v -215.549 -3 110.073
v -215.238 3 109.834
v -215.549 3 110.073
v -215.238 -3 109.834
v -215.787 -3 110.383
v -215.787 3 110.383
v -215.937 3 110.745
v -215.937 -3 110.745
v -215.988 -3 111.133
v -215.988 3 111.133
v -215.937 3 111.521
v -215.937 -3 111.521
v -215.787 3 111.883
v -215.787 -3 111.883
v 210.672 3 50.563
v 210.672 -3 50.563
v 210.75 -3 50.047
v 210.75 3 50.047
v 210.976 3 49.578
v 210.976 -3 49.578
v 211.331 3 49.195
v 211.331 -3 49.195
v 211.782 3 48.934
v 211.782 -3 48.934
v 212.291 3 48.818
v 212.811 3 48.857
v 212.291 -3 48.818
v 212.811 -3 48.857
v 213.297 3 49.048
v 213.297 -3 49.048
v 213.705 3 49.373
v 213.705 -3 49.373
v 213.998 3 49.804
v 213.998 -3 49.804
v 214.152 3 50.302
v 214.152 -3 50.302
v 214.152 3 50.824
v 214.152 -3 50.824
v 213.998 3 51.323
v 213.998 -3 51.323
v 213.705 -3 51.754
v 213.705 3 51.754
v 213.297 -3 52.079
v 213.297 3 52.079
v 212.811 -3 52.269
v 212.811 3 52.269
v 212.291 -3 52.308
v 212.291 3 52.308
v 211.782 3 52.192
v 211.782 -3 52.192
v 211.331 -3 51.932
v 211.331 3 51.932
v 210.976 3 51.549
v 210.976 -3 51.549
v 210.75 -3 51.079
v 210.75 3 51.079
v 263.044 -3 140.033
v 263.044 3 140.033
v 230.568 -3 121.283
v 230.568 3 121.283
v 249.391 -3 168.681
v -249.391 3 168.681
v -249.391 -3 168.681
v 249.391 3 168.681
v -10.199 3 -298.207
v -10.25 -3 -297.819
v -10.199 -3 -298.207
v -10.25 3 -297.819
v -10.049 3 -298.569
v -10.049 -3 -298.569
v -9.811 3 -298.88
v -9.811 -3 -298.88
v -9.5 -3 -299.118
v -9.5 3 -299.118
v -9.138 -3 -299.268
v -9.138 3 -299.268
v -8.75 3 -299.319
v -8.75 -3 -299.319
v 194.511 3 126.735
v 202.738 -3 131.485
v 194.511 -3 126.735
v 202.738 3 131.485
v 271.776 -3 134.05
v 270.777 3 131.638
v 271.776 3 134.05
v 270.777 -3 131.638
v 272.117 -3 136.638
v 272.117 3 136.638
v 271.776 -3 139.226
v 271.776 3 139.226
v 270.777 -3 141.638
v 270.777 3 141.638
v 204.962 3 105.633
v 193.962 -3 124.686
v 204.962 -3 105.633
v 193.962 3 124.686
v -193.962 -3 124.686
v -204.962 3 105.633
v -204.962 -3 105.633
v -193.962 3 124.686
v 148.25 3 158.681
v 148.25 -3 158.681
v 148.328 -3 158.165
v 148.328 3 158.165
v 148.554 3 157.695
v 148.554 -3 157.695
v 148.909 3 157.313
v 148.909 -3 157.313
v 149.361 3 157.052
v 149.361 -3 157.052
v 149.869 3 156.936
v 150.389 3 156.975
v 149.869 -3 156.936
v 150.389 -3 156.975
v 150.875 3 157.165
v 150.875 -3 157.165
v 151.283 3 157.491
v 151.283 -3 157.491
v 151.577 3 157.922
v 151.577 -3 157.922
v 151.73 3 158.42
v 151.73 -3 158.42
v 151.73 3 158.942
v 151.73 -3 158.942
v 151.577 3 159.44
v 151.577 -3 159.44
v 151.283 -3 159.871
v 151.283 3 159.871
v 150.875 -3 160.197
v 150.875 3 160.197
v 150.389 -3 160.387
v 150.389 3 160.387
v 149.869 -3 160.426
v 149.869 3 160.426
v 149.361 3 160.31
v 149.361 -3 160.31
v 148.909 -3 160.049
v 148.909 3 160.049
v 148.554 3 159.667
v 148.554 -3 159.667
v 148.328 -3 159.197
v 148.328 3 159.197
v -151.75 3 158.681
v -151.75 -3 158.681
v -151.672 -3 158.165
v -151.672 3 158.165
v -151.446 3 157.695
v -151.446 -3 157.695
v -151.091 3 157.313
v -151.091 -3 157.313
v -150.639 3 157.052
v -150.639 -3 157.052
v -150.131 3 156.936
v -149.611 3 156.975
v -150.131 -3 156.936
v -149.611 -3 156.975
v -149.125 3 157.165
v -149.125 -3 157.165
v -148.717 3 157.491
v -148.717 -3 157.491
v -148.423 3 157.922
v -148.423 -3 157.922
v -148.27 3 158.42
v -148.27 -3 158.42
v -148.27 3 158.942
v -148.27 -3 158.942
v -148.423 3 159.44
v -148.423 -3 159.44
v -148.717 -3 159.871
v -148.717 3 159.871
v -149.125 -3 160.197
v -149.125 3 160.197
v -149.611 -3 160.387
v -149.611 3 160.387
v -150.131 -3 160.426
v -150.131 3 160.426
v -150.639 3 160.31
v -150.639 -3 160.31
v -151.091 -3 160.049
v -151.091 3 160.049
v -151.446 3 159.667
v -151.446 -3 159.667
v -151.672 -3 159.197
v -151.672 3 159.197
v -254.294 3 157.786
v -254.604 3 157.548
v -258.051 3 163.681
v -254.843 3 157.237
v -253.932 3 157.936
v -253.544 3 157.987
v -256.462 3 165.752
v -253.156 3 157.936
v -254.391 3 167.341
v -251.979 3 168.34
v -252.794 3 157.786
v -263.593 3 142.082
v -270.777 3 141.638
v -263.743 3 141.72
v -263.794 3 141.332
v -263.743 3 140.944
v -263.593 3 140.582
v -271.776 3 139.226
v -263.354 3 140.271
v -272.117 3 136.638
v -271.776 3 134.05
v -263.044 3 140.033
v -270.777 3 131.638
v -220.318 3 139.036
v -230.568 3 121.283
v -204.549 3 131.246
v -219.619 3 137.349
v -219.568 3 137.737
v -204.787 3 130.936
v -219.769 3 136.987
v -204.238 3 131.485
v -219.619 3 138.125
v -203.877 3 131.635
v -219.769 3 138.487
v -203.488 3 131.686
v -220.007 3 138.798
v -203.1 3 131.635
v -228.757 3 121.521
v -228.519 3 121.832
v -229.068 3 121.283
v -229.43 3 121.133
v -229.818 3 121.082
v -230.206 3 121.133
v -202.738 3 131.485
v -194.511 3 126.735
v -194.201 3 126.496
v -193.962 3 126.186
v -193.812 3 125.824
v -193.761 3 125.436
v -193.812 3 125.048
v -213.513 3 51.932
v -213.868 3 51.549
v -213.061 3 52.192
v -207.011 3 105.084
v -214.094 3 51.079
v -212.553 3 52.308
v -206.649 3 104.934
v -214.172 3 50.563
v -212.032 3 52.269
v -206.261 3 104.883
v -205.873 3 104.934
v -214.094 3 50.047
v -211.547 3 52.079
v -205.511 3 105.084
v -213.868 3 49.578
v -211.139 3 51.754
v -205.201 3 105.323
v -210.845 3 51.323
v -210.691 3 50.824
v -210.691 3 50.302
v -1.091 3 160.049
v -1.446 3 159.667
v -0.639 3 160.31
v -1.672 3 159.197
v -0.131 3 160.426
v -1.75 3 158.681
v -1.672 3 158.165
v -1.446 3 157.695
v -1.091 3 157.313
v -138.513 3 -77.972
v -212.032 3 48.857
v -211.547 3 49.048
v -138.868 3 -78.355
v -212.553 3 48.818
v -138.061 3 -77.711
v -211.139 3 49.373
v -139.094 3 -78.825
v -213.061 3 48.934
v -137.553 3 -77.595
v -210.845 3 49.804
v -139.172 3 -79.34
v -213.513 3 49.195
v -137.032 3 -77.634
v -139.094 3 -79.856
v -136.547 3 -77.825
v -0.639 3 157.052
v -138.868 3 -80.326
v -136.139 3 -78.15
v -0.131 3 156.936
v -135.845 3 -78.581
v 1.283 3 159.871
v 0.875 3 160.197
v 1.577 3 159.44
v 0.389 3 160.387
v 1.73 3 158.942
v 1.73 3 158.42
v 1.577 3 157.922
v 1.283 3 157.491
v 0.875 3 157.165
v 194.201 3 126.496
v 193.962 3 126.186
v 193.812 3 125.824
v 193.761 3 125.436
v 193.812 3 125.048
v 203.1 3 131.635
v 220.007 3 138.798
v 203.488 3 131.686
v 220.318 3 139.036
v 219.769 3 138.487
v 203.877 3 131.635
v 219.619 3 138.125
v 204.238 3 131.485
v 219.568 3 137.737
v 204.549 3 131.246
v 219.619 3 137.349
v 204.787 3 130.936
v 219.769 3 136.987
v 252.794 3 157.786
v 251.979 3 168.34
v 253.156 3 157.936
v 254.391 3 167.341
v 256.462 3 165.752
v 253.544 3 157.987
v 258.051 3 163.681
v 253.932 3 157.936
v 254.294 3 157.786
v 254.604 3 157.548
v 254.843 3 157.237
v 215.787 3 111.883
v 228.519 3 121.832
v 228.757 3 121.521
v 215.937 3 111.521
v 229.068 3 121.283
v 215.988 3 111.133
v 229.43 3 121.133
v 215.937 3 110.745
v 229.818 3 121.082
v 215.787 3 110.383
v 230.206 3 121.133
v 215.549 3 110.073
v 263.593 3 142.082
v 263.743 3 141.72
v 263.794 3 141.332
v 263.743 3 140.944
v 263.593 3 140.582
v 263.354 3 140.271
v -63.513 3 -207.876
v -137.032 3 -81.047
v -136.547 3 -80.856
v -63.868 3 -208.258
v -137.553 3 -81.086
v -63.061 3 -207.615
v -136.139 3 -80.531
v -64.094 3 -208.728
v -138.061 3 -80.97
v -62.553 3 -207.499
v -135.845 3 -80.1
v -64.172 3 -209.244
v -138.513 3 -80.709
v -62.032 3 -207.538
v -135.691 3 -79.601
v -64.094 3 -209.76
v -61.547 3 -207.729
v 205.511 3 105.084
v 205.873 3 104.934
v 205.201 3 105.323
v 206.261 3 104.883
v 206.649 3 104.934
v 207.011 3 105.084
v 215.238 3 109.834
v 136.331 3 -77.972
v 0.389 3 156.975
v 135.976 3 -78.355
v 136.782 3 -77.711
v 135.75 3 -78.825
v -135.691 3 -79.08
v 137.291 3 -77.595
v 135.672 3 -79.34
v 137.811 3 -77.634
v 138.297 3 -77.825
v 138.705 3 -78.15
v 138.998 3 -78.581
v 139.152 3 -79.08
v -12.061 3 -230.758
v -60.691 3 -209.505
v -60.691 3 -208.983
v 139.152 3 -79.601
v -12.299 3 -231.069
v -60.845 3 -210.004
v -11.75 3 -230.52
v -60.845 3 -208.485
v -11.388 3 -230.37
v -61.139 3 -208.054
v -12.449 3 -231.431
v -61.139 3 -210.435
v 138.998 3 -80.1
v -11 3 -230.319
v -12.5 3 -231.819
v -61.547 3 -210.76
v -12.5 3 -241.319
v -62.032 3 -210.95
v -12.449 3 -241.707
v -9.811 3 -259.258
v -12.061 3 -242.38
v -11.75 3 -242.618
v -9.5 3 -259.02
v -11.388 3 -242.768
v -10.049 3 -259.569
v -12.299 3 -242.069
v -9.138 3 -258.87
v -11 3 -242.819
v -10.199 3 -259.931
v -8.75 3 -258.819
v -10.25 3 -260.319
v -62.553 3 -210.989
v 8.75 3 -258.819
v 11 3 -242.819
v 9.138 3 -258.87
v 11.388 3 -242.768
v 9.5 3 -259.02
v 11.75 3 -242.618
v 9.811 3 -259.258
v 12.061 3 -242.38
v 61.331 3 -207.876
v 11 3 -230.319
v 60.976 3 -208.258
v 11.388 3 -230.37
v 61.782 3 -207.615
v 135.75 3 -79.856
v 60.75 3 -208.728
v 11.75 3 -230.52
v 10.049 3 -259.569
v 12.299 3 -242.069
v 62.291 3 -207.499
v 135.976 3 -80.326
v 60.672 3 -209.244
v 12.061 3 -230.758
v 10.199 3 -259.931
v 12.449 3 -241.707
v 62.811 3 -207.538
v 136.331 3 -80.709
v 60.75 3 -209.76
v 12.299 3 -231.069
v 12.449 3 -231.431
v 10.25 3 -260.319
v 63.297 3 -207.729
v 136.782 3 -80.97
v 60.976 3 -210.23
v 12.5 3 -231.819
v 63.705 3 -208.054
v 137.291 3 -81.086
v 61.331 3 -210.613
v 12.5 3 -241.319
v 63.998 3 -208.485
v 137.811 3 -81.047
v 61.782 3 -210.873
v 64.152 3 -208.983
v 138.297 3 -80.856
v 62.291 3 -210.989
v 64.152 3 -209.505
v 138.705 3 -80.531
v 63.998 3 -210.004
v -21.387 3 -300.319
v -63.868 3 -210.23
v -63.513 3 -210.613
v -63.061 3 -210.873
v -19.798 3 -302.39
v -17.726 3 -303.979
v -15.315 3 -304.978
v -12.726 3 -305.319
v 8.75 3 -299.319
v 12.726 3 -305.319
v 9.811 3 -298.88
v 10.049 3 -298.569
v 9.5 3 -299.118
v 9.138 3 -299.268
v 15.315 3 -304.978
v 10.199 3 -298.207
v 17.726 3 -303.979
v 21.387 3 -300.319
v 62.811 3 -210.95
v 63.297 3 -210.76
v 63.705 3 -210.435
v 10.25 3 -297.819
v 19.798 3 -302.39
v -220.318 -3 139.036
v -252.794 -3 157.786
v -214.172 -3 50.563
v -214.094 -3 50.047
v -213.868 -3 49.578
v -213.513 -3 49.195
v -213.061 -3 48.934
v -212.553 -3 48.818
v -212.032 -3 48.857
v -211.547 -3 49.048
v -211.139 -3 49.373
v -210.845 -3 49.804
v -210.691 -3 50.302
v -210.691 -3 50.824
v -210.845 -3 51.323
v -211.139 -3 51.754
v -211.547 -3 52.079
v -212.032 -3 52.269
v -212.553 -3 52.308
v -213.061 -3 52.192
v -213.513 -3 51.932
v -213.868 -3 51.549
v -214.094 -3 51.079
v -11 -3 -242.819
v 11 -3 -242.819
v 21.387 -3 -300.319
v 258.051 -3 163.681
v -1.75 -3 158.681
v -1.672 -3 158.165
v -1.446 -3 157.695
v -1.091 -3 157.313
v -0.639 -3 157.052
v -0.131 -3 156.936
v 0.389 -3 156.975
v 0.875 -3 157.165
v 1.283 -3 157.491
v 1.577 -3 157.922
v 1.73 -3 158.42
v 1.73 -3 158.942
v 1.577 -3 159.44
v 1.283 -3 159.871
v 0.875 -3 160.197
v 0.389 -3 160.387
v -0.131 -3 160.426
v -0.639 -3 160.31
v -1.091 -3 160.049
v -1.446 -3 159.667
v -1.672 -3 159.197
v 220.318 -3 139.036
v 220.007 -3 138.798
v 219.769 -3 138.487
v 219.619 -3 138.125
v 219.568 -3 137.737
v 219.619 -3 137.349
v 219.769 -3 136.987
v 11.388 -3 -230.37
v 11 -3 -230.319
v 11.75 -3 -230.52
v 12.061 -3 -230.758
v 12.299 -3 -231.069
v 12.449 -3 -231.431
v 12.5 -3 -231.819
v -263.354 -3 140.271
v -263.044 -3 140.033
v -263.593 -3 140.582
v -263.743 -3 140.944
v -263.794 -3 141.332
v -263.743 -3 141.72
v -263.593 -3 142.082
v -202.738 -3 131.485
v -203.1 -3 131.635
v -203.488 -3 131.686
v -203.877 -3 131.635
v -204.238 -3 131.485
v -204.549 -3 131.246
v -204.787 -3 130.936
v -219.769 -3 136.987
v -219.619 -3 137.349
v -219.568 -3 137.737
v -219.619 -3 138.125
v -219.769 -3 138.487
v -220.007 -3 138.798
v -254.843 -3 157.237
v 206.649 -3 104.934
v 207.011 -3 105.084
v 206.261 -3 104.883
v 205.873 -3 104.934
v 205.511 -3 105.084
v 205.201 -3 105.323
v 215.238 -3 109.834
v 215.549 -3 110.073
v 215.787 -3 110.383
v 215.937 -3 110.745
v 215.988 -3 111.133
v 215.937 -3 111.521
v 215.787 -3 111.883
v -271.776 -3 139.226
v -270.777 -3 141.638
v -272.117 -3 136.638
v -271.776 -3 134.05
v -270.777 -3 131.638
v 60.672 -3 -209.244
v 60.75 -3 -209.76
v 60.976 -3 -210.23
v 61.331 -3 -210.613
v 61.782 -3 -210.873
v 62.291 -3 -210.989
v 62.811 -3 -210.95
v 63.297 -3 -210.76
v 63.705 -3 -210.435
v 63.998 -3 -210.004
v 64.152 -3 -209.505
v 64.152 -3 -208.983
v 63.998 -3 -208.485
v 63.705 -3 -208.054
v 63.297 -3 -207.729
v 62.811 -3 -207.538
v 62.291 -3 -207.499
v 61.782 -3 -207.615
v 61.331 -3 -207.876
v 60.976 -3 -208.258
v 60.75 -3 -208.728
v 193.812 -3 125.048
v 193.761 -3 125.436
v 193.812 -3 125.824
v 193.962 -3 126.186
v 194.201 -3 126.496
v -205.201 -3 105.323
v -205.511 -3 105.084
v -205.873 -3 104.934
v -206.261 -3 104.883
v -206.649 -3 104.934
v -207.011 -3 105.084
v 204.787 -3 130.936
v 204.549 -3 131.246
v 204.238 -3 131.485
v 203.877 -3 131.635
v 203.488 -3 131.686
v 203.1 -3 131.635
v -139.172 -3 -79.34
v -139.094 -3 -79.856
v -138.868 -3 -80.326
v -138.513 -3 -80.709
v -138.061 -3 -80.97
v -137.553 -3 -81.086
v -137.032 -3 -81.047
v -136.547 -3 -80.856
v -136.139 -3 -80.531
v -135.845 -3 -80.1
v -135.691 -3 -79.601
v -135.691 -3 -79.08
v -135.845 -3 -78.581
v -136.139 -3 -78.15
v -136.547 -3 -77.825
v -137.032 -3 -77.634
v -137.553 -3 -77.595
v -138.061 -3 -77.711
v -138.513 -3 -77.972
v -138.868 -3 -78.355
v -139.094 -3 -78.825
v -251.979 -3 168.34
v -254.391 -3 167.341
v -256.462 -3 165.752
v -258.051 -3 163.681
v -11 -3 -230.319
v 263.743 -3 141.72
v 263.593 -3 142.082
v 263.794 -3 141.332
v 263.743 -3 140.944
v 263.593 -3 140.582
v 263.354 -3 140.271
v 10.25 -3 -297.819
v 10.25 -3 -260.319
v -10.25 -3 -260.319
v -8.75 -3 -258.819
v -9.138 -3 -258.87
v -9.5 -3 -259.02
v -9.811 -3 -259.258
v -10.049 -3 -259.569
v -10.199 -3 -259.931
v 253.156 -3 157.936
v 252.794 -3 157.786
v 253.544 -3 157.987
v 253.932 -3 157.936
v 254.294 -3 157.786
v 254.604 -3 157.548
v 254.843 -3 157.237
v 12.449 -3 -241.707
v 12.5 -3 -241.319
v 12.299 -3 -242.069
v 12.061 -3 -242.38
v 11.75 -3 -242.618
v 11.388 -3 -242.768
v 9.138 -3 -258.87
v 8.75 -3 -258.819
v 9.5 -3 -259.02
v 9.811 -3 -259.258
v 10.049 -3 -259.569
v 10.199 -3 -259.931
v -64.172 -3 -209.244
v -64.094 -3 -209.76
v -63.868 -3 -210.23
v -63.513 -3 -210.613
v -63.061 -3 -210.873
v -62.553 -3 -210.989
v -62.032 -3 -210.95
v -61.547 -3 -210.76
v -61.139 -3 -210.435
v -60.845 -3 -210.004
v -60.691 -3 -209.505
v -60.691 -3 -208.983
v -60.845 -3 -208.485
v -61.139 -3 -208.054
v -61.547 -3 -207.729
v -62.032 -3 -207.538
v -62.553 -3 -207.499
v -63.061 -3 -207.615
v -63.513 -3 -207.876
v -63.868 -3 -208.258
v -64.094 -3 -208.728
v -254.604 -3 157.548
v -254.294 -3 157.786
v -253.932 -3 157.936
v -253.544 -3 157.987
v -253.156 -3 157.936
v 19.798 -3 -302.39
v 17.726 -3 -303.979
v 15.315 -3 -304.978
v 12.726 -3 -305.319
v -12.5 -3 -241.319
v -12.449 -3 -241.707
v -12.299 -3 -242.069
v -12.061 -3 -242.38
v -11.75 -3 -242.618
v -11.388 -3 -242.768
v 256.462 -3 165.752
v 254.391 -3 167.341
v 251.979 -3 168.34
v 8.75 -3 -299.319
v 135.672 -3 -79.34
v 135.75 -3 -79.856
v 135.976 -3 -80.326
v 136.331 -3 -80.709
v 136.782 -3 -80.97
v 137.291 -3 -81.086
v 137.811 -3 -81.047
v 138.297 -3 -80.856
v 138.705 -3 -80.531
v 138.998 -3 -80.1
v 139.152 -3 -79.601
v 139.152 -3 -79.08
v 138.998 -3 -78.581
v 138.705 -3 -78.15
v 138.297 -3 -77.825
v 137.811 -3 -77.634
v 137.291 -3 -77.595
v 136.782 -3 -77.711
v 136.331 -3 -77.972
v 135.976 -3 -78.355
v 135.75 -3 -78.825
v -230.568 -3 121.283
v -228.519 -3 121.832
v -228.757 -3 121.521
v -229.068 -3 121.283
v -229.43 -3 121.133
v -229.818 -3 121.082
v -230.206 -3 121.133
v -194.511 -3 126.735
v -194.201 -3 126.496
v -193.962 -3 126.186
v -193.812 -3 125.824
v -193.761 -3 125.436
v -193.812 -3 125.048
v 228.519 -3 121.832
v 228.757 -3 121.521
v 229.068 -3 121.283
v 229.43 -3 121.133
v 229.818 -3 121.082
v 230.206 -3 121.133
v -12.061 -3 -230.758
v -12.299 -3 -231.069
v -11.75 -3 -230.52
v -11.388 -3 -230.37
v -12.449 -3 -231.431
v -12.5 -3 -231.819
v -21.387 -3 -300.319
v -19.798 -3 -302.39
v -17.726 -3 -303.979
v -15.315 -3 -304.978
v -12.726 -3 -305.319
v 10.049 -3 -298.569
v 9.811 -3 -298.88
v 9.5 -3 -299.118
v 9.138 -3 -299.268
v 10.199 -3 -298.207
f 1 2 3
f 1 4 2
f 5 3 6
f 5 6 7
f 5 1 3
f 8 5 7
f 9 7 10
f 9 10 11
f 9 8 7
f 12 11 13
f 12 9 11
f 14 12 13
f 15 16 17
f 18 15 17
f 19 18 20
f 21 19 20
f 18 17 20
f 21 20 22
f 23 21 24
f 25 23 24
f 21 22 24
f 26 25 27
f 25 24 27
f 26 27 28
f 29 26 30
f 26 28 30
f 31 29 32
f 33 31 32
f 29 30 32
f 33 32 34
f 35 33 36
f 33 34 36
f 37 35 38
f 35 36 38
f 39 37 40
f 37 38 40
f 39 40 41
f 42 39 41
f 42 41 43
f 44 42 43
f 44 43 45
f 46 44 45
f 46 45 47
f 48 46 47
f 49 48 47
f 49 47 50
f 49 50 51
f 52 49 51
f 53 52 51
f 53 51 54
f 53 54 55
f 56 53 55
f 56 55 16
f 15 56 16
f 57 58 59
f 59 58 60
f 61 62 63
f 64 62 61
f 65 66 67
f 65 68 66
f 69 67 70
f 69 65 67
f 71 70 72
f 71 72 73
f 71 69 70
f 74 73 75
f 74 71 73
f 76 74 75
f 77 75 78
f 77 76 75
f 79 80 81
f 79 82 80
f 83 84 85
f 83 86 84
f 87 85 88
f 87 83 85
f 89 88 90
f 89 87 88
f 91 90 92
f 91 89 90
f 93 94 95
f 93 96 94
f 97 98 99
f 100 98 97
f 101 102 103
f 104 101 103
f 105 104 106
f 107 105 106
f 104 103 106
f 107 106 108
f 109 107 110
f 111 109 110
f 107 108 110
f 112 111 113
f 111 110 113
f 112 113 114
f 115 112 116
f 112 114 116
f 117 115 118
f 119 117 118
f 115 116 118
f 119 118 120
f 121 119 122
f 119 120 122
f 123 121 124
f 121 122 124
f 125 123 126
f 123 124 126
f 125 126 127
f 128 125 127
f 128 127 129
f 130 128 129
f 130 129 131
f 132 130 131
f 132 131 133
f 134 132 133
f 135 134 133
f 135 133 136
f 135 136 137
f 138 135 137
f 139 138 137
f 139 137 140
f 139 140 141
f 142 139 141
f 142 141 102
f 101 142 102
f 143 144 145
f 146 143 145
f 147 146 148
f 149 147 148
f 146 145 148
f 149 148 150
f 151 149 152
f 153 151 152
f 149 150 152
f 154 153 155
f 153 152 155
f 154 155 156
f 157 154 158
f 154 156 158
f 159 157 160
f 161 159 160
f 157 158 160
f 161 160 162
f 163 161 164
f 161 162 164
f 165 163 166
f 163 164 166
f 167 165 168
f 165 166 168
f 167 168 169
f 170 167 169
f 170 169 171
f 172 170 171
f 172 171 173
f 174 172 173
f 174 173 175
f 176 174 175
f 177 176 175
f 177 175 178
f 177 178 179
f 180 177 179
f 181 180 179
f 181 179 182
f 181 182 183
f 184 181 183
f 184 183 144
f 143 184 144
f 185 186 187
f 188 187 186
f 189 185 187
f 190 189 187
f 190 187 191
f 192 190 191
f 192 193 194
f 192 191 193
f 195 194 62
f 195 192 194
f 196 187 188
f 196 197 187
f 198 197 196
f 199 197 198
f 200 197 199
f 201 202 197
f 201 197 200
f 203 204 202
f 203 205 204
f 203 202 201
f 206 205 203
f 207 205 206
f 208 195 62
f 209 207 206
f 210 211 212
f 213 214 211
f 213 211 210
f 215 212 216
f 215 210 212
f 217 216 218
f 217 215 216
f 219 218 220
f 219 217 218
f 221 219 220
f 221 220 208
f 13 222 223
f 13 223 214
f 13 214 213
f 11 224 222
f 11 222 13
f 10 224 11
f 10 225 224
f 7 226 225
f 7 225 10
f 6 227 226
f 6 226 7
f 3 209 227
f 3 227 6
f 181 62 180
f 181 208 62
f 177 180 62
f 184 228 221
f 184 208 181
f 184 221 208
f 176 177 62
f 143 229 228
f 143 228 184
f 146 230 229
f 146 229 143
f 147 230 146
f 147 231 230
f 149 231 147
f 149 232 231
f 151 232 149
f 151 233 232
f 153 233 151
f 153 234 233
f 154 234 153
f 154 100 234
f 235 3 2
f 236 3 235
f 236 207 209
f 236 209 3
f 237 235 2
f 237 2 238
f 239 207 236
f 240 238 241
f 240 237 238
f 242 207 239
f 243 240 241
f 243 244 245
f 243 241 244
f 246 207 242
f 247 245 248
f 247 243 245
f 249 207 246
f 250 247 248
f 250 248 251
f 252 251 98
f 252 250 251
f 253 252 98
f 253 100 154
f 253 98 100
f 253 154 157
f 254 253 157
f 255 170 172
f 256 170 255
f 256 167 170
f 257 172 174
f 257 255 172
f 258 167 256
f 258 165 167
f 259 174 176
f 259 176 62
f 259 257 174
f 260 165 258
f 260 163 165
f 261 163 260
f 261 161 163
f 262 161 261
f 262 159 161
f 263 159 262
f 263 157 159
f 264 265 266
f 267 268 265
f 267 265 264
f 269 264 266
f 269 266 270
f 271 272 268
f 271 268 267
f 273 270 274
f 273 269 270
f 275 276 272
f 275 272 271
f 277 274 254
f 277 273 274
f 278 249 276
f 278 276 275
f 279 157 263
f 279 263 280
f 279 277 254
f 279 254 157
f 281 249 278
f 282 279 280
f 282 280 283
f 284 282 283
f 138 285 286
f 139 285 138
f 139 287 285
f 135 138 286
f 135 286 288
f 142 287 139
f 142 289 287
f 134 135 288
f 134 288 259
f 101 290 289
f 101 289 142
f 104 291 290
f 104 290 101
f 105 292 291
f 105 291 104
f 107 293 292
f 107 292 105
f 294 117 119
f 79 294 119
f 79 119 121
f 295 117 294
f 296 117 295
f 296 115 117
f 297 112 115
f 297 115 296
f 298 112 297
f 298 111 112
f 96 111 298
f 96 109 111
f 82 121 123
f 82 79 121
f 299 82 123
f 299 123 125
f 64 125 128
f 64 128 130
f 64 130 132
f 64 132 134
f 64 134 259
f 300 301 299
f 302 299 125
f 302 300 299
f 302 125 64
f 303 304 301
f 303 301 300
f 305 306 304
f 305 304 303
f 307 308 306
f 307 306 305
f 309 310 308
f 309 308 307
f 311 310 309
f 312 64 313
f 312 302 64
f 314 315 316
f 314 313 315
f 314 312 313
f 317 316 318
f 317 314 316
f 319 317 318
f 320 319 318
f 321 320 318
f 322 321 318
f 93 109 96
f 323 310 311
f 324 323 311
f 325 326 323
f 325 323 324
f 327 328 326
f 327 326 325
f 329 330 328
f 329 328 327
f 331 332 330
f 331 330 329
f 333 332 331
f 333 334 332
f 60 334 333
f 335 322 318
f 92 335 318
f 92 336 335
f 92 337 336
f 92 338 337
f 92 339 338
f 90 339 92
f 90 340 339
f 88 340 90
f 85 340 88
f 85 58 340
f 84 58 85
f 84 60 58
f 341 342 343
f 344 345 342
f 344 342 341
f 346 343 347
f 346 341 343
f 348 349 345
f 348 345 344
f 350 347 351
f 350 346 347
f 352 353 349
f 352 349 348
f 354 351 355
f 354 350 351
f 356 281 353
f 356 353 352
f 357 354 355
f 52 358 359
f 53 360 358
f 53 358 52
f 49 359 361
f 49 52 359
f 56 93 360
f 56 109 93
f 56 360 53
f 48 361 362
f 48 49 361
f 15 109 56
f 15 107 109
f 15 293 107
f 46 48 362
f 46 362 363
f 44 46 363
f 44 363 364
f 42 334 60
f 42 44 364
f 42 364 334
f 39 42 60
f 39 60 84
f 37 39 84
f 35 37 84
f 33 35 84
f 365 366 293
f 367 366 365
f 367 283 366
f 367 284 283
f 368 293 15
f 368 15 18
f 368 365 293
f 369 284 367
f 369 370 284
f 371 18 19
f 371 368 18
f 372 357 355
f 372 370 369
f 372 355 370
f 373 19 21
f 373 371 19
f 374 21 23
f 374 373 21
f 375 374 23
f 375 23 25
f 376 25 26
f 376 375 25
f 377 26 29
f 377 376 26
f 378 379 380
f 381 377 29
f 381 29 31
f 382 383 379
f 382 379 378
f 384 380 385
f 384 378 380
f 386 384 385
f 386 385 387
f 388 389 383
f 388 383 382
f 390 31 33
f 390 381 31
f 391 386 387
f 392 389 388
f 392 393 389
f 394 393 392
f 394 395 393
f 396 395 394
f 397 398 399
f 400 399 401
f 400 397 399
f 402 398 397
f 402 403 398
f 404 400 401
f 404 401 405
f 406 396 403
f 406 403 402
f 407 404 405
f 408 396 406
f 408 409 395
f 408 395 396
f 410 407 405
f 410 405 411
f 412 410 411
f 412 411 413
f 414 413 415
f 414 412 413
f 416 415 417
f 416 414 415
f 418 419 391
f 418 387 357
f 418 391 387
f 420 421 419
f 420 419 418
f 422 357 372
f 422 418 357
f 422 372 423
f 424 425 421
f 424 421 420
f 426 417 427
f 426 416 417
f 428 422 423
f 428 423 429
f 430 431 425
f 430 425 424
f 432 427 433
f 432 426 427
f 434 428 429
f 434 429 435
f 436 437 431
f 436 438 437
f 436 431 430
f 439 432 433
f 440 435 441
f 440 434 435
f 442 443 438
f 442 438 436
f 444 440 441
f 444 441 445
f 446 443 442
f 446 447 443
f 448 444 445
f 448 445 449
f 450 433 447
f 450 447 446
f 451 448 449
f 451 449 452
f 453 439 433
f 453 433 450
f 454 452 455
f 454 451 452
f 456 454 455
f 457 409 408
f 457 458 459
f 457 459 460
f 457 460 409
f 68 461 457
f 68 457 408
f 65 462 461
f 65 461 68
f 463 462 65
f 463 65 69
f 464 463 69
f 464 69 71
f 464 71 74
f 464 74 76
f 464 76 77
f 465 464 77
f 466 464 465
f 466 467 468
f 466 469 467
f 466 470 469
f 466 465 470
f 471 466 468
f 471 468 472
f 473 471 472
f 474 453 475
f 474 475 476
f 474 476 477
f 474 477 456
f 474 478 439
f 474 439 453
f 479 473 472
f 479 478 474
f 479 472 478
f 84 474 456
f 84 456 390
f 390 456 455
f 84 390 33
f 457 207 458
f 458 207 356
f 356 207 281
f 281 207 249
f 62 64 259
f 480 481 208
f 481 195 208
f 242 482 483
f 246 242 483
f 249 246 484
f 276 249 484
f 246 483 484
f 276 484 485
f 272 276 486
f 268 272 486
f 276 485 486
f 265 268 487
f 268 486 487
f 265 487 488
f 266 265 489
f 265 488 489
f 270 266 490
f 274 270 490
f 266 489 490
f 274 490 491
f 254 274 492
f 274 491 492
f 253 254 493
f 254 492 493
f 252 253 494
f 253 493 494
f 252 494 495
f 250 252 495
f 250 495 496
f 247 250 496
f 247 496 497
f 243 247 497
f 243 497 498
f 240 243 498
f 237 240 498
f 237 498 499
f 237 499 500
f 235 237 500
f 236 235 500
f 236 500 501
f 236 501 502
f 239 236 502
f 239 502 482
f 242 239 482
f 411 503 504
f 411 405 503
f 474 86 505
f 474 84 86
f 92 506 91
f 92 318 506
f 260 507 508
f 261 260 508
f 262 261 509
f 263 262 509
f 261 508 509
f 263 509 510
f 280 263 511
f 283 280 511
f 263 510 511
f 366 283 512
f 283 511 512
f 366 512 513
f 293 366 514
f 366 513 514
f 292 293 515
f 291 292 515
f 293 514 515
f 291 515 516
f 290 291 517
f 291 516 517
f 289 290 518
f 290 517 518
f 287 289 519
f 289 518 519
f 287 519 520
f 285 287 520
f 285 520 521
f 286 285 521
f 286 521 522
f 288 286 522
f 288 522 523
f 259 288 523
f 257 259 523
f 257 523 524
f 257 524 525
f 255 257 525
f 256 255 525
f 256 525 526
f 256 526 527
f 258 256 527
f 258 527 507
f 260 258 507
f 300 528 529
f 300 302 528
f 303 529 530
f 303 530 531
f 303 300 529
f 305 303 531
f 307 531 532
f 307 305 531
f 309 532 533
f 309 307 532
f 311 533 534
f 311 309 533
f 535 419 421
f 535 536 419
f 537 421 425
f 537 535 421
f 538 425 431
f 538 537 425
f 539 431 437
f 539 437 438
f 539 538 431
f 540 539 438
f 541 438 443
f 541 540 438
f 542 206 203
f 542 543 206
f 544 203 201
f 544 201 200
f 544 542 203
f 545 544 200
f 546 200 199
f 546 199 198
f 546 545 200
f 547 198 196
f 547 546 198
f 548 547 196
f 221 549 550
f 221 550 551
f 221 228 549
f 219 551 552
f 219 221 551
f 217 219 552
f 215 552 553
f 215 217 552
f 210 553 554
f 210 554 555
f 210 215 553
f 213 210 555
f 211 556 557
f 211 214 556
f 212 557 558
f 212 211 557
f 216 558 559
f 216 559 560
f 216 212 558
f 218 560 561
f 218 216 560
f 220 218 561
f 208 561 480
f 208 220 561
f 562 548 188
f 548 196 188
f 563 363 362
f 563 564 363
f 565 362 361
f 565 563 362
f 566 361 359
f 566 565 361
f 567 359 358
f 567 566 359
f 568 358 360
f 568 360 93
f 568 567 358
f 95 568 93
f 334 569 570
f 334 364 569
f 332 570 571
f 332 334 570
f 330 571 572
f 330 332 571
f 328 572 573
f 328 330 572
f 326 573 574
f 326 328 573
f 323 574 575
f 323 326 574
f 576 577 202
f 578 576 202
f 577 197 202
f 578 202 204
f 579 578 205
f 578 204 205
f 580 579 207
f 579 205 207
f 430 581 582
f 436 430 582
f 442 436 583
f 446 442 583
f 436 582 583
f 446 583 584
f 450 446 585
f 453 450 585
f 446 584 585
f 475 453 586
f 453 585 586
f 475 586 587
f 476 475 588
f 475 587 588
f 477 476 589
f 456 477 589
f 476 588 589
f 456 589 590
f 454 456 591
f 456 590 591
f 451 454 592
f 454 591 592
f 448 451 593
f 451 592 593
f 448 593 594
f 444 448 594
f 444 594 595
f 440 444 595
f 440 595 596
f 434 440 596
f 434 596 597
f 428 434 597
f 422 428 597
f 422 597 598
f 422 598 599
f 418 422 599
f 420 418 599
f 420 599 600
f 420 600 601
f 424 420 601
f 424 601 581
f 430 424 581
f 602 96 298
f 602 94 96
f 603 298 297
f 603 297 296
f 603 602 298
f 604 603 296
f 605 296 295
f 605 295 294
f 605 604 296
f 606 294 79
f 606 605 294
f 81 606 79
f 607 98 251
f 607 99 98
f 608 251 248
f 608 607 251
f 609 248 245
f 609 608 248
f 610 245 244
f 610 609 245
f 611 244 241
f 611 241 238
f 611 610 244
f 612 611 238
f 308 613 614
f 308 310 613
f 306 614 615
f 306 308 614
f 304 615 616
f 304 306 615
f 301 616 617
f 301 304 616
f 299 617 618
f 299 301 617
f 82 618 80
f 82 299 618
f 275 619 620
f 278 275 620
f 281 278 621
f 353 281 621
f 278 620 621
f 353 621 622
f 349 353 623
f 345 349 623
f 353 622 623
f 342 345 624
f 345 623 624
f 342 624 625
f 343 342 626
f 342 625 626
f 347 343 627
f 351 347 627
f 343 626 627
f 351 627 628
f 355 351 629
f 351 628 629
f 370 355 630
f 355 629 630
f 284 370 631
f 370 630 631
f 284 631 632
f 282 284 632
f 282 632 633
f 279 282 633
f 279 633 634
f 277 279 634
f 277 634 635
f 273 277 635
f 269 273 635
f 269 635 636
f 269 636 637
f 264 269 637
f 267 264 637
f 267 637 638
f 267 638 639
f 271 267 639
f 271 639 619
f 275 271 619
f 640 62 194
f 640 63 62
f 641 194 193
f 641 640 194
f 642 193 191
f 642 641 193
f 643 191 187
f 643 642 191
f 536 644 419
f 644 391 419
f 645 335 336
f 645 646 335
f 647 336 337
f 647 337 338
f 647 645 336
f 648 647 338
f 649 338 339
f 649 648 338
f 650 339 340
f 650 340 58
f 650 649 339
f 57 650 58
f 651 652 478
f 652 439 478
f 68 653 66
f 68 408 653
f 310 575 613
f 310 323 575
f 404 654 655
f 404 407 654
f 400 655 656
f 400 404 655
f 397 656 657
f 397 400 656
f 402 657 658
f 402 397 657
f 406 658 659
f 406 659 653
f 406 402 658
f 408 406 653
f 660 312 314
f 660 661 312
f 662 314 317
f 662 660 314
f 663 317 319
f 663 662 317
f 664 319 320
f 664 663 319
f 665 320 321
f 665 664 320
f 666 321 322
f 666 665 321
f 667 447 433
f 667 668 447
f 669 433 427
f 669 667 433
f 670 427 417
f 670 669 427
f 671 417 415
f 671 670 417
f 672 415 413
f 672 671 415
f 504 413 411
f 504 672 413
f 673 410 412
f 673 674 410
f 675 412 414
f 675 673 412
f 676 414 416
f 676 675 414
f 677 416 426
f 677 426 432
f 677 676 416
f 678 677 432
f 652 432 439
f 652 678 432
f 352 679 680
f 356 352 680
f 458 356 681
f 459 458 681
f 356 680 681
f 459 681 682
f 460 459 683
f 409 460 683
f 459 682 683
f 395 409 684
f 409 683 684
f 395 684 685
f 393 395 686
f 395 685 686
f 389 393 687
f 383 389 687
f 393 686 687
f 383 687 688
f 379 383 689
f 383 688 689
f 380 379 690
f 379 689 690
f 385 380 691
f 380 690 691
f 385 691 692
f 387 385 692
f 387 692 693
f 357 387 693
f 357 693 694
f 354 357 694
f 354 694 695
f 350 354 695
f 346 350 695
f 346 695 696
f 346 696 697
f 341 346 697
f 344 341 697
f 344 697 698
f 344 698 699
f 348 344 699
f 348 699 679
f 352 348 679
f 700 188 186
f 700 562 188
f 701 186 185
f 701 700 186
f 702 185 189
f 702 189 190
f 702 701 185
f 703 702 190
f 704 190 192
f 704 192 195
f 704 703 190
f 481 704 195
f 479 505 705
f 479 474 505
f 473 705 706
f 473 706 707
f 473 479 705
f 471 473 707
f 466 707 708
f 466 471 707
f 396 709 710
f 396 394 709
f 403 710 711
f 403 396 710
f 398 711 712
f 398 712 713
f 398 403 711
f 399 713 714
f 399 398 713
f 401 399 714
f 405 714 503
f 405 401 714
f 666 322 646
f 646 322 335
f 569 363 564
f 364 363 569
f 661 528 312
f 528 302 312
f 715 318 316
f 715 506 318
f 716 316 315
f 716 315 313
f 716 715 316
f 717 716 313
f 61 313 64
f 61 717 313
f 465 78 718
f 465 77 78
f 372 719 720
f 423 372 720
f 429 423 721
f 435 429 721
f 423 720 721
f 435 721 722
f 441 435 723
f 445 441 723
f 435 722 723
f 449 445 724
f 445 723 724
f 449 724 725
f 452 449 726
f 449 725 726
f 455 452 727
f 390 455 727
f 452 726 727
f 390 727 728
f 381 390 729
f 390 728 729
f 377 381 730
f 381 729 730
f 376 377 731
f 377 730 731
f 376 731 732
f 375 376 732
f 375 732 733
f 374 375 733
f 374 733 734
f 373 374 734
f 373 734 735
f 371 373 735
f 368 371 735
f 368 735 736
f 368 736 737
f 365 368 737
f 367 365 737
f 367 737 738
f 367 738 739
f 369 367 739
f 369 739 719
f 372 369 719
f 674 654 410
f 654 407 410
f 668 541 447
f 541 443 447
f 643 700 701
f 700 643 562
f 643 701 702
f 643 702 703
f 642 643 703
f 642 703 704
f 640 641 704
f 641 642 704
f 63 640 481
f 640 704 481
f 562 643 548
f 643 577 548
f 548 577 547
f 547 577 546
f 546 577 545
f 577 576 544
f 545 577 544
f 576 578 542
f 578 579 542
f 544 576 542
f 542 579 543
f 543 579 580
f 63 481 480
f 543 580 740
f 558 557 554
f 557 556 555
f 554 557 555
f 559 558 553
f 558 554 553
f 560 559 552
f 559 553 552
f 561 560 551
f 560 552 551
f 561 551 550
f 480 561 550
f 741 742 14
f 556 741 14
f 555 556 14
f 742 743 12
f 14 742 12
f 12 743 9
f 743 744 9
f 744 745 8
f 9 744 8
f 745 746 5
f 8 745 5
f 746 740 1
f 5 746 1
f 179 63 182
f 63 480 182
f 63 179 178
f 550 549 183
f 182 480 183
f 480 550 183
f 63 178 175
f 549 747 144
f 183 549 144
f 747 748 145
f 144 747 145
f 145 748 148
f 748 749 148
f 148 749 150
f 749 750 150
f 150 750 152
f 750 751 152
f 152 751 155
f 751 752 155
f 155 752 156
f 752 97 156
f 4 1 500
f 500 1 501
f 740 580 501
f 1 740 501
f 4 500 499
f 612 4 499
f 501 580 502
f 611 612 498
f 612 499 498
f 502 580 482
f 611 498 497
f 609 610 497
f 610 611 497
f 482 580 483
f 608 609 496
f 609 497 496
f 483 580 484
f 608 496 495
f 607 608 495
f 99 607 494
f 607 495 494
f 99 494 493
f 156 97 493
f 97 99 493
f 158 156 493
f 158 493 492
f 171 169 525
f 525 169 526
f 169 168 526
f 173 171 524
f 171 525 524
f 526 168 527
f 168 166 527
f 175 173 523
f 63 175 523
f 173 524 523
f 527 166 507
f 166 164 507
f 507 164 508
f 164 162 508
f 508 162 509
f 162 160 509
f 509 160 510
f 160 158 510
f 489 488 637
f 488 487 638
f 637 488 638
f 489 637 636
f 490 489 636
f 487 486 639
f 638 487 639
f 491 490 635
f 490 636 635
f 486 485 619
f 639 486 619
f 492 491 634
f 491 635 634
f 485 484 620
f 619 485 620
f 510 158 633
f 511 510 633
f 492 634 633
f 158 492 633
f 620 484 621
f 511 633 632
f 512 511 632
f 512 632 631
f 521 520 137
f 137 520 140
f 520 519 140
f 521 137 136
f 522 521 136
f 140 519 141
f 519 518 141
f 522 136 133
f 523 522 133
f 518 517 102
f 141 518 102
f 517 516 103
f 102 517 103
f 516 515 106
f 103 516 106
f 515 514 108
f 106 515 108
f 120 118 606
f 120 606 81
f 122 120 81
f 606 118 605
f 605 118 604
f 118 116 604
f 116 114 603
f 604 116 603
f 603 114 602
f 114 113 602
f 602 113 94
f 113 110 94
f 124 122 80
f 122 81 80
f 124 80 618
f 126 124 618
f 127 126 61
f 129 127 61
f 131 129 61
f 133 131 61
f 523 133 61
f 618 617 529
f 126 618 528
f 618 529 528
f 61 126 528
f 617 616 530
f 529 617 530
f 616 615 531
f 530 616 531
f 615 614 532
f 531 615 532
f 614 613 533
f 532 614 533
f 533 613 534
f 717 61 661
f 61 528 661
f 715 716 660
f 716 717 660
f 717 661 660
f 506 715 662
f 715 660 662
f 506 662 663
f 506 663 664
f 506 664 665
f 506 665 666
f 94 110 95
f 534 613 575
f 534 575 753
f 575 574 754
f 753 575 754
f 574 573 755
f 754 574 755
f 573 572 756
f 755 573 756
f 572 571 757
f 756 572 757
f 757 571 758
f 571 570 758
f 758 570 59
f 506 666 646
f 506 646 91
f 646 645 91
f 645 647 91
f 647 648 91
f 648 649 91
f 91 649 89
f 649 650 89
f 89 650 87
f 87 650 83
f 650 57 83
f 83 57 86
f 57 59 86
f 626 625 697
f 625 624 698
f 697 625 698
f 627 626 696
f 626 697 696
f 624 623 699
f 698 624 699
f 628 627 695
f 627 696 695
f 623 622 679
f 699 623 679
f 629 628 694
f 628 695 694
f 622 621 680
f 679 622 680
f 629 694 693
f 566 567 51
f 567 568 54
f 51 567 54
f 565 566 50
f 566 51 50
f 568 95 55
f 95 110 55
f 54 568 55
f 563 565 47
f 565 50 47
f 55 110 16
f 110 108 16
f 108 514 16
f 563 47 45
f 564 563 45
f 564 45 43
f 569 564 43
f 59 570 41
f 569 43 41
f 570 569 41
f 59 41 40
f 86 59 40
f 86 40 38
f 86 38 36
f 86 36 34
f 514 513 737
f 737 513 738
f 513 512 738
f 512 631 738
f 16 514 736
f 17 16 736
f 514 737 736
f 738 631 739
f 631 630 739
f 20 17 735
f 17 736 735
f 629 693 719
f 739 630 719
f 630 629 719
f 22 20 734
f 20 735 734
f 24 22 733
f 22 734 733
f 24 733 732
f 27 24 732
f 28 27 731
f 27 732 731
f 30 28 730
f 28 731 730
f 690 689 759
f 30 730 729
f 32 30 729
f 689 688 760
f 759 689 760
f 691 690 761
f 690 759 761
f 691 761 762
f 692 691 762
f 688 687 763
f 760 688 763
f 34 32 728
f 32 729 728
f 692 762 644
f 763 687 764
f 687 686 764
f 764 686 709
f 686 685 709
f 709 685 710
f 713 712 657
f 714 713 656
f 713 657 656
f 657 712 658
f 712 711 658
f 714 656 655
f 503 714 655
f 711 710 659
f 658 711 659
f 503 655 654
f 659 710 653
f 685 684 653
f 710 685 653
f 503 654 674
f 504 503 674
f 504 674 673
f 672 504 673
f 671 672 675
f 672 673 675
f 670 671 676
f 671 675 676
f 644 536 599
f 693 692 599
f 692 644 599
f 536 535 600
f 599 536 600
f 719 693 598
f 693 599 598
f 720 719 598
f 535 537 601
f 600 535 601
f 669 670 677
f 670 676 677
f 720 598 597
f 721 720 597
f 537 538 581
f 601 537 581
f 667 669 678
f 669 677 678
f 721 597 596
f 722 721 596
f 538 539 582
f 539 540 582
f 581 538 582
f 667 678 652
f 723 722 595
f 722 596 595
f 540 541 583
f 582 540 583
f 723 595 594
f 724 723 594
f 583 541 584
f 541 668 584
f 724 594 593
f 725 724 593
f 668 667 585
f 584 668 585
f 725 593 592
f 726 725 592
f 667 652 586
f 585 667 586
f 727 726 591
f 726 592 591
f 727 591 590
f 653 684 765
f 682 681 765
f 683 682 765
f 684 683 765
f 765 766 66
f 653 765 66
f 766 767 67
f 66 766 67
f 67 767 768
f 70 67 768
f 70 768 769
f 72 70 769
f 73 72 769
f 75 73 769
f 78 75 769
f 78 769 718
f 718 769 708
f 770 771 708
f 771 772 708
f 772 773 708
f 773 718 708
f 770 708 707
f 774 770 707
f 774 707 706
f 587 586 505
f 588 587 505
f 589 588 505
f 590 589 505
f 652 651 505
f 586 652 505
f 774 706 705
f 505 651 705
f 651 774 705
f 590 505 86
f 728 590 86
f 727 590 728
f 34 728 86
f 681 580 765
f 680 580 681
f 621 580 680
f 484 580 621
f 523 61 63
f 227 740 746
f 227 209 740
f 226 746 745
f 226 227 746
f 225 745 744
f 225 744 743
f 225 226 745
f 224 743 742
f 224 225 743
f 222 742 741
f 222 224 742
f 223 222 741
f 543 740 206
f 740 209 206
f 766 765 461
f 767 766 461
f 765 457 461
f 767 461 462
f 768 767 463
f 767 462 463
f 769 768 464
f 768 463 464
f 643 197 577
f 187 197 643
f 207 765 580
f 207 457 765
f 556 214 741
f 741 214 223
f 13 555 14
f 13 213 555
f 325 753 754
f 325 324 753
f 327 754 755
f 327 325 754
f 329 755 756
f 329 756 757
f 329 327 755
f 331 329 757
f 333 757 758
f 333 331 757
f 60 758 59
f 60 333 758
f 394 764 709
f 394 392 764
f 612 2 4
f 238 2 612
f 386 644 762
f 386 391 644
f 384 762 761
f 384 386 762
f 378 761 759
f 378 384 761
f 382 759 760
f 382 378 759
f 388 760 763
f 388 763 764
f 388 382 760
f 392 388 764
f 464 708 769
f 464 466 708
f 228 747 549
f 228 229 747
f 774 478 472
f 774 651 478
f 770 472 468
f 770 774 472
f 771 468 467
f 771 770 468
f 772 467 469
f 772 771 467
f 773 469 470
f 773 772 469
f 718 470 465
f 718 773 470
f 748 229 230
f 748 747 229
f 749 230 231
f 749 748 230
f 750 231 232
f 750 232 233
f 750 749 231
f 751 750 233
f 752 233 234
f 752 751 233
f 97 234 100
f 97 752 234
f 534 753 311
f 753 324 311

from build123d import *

# Parameters (mm, degrees)
SKETCH_1_W         = 20.5
SKETCH_1_H         = 40.5
SKETCH_1_W_2       = 25
SKETCH_1_H_2       = 12.5
EXTRUDE_1388_DEPTH = 3
FILLET_1_R         = 10
FILLET_2_R         = 1.5
HOLE_WIZARD_3_5_D  = 3.5


with BuildPart() as part:
    # Эскиз1 → Extrude 1388 (new, symmetric)
    with BuildSketch(Plane(origin=(0, 0, 0), x_dir=(1, 0, 0), z_dir=(0, 1, 0))):
        Polygon((273.664027596, -136.63804004), (18.5, 305.31902002), (-18.5, 305.31902002), (-273.664027596, -136.63804004), (-255.164027596, -168.68097998), (255.164027596, -168.68097998), align=None)
        Polygon((219.01884632, -138.286270399), (254.092875173, -158.536270399), (264.342875173, -140.782749621), (229.26884632, -120.532749621), align=None, mode=Mode.SUBTRACT)
        with Locations((0, 279.06902002)):
            Rectangle(SKETCH_1_W, SKETCH_1_H, mode=Mode.SUBTRACT)
        Polygon((-229.26884632, -120.532749621), (-264.342875173, -140.782749621), (-254.092875173, -158.536270399), (-219.01884632, -138.286270399), align=None, mode=Mode.SUBTRACT)
        Polygon((216.537439859, -110.584192463), (204.037439859, -132.234827557), (193.212122312, -125.984827557), (205.712122312, -104.334192463), align=None, mode=Mode.SUBTRACT)
        with Locations((0, 236.56902002)):
            Rectangle(SKETCH_1_W_2, SKETCH_1_H_2, mode=Mode.SUBTRACT)
        Polygon((-204.037439859, -132.234827557), (-216.537439859, -110.584192463), (-205.712122312, -104.334192463), (-193.212122312, -125.984827557), align=None, mode=Mode.SUBTRACT)
    extrude(amount=EXTRUDE_1388_DEPTH, both=True)

    # Скругление1
    fillet_1_edges = [part.edges().sort_by_distance(p)[0] for p in [
        (255.164027596, 0, 168.68097998),
        (-255.164027596, 0, 168.68097998),
        (-273.664027596, 0, 136.63804004),
        (-18.5, 0, -305.31902002),
        (18.5, 0, -305.31902002),
        (273.664027596, 0, 136.63804004),
    ]]
    fillet(fillet_1_edges, radius=FILLET_1_R)

    # Скругление2
    fillet_2_edges = [part.edges().sort_by_distance(p)[0] for p in [
        (10.25, 0, -258.81902002),
        (10.25, 0, -299.31902002),
        (-10.25, 0, -299.31902002),
        (-10.25, 0, -258.81902002),
        (12.5, 0, -230.31902002),
        (12.5, 0, -242.81902002),
        (-12.5, 0, -242.81902002),
        (-12.5, 0, -230.31902002),
        (229.26884632, 0, 120.532749621),
        (219.01884632, 0, 138.286270399),
        (254.092875173, 0, 158.536270399),
        (264.342875173, 0, 140.782749621),
        (-219.01884632, 0, 138.286270399),
        (-229.26884632, 0, 120.532749621),
        (-264.342875173, 0, 140.782749621),
        (-254.092875173, 0, 158.536270399),
        (193.212122312, 0, 125.984827557),
        (204.037439859, 0, 132.234827557),
        (216.537439859, 0, 110.584192463),
        (205.712122312, 0, 104.334192463),
        (-205.712122312, 0, 104.334192463),
        (-216.537439859, 0, 110.584192463),
        (-204.037439859, 0, 132.234827557),
        (-193.212122312, 0, 125.984827557),
    ]]
    fillet(fillet_2_edges, radius=FILLET_2_R)

    # Отверстия 3,5мм (through all)
    with Locations(Plane(origin=(0, 3, 0), x_dir=(1, 0, 0), z_dir=(0, 1, 0))):
        with Locations((-137.42175976, 79.34048999), (-62.42175976, 209.244300558), (62.42175976, 209.244300558), (137.42175976, 79.34048999), (212.42175976, -50.563320578), (150, -158.68097998), (0, -158.68097998), (-150, -158.68097998), (-212.42175976, -50.563320578)):
            Hole(HOLE_WIZARD_3_5_D / 2)


solid = part.part
